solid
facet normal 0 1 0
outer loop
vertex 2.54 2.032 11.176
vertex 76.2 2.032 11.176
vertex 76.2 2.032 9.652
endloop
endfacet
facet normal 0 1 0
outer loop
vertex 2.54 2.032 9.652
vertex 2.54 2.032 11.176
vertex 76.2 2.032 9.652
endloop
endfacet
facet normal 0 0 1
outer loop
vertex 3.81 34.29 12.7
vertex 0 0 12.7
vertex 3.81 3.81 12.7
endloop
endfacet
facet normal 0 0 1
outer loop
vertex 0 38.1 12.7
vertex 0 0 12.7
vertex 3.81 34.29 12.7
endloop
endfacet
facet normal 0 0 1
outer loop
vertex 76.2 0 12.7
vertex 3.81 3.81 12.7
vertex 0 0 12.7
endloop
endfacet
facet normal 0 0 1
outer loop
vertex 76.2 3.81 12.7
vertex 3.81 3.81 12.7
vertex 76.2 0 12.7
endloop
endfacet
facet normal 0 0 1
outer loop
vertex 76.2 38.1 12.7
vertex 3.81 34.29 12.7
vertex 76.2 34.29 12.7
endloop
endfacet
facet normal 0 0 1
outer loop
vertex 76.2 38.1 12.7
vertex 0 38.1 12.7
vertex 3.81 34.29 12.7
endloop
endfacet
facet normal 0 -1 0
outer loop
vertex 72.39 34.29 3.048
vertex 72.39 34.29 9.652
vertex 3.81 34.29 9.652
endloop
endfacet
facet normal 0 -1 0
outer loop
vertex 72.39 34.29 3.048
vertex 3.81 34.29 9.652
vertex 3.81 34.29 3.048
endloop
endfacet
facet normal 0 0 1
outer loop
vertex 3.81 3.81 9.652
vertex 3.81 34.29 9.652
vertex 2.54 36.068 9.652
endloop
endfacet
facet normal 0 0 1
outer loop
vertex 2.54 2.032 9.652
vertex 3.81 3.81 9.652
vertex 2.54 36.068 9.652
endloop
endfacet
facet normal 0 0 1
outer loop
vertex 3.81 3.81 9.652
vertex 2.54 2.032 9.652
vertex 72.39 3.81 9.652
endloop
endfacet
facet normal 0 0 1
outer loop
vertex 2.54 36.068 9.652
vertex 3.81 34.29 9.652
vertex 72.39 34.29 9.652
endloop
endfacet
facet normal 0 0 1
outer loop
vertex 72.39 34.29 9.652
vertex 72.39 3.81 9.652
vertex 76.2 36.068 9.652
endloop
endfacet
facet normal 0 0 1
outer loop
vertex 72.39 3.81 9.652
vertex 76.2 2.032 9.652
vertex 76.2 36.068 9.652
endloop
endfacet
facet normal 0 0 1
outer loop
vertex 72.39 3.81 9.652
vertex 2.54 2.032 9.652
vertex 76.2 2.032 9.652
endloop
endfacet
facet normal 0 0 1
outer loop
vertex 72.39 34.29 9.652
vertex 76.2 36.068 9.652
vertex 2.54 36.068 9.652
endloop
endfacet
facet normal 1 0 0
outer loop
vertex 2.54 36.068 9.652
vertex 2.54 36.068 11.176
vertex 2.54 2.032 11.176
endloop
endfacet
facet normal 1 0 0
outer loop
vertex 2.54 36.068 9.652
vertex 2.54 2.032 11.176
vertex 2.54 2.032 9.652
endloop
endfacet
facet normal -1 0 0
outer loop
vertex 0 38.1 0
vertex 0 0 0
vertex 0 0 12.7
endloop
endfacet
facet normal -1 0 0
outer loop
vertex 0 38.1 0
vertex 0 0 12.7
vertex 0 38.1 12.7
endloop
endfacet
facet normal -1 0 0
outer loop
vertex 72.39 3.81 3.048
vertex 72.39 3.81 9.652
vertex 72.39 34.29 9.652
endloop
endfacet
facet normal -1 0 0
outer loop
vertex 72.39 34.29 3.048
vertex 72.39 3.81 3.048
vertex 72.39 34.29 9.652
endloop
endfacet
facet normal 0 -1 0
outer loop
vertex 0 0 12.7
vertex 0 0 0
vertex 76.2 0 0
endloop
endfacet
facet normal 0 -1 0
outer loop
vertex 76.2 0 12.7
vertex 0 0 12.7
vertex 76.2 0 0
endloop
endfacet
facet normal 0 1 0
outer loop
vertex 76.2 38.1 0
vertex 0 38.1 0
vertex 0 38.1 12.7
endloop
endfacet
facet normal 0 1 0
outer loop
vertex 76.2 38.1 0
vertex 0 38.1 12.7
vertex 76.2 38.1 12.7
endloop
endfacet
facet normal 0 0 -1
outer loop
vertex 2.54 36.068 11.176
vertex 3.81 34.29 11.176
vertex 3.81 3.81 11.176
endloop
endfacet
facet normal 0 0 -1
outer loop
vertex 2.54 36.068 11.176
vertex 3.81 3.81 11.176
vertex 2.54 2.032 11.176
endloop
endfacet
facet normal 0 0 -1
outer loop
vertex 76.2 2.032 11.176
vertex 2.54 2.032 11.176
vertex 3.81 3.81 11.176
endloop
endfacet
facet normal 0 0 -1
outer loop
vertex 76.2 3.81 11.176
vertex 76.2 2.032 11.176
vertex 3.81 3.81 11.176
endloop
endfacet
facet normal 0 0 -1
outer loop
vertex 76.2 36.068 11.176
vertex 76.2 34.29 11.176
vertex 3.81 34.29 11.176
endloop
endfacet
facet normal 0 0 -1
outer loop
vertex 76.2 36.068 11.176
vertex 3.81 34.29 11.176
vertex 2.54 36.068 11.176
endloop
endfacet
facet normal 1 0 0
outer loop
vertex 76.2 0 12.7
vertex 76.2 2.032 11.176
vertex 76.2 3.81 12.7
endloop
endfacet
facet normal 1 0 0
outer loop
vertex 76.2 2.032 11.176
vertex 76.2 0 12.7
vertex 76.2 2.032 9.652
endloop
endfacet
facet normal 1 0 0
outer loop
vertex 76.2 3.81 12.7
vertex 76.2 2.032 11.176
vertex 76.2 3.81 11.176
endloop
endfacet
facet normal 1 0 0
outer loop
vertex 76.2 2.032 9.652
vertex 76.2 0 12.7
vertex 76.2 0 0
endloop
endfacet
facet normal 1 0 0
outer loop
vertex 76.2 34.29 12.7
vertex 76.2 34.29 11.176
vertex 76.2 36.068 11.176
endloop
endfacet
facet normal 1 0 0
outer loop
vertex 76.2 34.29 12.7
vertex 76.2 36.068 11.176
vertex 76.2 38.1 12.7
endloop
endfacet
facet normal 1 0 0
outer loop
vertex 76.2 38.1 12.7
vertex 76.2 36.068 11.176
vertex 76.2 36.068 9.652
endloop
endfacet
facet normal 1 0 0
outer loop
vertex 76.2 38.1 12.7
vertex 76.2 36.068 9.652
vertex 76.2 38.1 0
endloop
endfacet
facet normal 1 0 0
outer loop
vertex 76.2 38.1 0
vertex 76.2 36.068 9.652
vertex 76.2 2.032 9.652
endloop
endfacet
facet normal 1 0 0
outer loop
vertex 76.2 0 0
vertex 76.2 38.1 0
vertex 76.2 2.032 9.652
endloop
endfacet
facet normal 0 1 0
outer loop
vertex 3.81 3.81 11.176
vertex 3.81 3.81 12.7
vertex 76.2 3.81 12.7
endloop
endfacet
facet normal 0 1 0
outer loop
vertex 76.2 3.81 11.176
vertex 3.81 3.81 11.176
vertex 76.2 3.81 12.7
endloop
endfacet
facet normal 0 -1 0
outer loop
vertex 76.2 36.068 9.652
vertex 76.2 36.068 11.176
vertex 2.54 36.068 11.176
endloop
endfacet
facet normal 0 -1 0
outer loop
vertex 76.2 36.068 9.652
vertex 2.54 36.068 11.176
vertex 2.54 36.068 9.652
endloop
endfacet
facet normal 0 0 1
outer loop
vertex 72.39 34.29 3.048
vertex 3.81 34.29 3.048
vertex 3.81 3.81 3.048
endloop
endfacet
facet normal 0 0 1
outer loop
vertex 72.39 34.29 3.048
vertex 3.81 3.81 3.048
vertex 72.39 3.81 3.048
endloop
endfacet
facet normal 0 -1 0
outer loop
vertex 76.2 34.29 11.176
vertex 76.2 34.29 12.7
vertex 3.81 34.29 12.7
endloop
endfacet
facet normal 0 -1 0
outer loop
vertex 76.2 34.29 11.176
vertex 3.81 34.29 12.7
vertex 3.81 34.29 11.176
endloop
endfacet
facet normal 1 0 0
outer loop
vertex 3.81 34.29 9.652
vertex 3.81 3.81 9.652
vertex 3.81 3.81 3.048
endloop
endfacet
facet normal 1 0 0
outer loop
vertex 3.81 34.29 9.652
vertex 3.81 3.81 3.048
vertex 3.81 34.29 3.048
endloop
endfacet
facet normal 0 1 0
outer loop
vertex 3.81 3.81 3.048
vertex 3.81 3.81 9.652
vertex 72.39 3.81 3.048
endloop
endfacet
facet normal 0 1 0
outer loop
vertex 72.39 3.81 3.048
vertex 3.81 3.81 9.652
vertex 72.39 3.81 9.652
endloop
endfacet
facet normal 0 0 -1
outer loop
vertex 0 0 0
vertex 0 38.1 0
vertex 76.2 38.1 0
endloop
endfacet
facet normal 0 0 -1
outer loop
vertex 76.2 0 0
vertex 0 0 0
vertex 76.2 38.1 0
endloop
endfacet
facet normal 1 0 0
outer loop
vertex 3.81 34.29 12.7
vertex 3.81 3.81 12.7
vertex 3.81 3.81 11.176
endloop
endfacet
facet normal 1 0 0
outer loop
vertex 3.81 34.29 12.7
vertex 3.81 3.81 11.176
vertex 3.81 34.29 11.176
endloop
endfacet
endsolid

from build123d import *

# Parameters (mm, degrees)
SKETCH1_W           = 76.2
SKETCH1_H           = 38.1
BOSS_EXTRUDE1_DEPTH = 12.7
SKETCH3_W           = 34.29
SKETCH3_H           = 30.48
CUT_EXTRUDE1_DEPTH  = 9.652
SKETCH5_W           = 2.54
SKETCH5_H           = 30.48
CUT_EXTRUDE3_DEPTH  = 3.81
SKETCH6_W           = 1.524
SKETCH6_H           = 34.036
CUT_EXTRUDE4_DEPTH  = 73.66


with BuildPart() as part:
    # Sketch1 → Boss-Extrude1 (new body)
    with BuildSketch(Plane.XY):
        with Locations((38.1, 19.05)):
            Rectangle(SKETCH1_W, SKETCH1_H)
    extrude(amount=BOSS_EXTRUDE1_DEPTH)

    # Sketch3 → Cut-Extrude1 (cut)
    with BuildSketch(Plane.XY.offset(12.7)):
        with Locations((20.955, 19.05)):
            Rectangle(SKETCH3_W, SKETCH3_H)
        with Locations((55.245, 19.05)):
            Rectangle(SKETCH3_W, SKETCH3_H)
    extrude(amount=-CUT_EXTRUDE1_DEPTH, mode=Mode.SUBTRACT)

    # Sketch5 → Cut-Extrude3 (cut)
    with BuildSketch(Plane(origin=(76.2, 0, 0), x_dir=(0, 0, -1), z_dir=(1, 0, 0))):
        with Locations((-11.43, 19.05)):
            Rectangle(SKETCH5_W, SKETCH5_H)
    extrude(amount=-CUT_EXTRUDE3_DEPTH, mode=Mode.SUBTRACT)

    # Sketch6 → Cut-Extrude4 (cut)
    with BuildSketch(Plane(origin=(76.2, 0, 0), x_dir=(0, 0, -1), z_dir=(1, 0, 0))):
        with Locations((-10.414, 19.05)):
            Rectangle(SKETCH6_W, SKETCH6_H)
    extrude(amount=-CUT_EXTRUDE4_DEPTH, mode=Mode.SUBTRACT)


solid = part.part
